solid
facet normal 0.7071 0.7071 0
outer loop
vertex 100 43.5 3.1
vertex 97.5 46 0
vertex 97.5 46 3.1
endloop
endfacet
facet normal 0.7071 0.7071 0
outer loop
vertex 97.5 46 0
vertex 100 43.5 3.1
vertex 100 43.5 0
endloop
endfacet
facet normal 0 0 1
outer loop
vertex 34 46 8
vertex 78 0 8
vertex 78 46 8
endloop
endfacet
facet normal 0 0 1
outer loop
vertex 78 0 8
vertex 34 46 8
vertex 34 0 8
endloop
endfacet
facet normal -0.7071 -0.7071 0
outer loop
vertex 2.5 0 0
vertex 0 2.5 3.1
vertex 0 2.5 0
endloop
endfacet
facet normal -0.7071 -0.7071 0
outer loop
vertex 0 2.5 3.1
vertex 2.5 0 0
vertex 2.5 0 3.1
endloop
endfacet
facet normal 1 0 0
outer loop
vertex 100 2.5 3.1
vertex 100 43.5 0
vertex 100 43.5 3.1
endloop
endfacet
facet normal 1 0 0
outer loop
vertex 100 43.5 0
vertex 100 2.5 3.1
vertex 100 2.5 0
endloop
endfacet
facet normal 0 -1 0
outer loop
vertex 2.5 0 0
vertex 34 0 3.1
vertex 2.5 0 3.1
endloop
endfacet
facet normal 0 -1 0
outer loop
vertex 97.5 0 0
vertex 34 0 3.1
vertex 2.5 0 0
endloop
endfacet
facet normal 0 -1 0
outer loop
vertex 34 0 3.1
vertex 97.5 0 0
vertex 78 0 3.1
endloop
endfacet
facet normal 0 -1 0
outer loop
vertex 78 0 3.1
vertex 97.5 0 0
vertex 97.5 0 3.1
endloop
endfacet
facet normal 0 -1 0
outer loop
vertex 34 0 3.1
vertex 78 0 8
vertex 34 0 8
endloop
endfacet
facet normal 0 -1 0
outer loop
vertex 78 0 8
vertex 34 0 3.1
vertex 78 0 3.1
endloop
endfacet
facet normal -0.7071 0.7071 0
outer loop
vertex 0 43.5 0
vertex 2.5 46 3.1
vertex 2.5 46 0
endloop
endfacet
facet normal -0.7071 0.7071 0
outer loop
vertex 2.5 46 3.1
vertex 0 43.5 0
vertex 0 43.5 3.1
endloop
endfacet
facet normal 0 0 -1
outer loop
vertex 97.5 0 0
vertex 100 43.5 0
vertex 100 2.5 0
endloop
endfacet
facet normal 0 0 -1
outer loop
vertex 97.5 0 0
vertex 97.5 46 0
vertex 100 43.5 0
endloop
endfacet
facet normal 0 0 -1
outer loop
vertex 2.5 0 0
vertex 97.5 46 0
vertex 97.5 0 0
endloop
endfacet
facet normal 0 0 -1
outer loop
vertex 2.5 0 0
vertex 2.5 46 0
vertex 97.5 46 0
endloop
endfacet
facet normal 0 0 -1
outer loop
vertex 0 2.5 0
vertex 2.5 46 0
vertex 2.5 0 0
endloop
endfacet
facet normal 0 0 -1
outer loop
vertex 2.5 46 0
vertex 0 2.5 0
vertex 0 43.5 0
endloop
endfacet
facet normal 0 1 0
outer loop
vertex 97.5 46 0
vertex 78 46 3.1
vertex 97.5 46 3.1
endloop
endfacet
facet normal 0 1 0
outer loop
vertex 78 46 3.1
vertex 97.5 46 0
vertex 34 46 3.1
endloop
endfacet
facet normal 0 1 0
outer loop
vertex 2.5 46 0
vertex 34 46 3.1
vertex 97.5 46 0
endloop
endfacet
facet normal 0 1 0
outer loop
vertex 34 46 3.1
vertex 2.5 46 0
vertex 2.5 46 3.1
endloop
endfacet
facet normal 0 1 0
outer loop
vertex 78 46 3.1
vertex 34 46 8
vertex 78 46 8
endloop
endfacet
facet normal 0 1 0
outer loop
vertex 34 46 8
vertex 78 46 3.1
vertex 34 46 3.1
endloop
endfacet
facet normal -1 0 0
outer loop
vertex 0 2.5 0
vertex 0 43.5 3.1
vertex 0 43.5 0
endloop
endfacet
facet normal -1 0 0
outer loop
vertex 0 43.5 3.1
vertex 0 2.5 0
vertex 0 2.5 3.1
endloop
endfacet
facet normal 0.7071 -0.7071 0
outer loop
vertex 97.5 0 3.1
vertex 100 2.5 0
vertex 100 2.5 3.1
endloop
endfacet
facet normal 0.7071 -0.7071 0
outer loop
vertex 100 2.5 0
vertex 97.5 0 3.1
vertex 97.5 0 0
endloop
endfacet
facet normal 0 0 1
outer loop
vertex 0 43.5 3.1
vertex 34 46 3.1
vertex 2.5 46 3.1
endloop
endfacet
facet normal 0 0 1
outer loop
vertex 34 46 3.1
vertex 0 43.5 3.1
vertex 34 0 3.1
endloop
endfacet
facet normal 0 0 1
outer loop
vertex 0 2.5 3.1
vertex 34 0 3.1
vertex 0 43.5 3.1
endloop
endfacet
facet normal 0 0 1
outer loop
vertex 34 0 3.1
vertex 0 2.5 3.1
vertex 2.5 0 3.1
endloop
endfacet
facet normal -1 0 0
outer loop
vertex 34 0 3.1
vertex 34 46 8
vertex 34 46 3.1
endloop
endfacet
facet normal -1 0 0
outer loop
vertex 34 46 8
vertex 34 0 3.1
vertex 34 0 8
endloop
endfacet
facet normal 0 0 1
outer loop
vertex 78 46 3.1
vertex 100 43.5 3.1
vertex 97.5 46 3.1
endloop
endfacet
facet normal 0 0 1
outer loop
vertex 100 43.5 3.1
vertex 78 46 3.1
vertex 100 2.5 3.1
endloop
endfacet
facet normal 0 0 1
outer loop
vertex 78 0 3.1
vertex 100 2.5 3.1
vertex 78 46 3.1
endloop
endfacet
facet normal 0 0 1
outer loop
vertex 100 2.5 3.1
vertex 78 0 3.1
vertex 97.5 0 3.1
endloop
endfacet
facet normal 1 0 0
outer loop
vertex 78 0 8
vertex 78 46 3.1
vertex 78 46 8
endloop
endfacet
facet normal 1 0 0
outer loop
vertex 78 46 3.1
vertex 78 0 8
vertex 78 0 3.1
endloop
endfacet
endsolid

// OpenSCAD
$fn = 32;

// ----------------------------------------------------------------------
// Stepped bar: centerstep, 100 x 46 x 8/3.1 mm
// ----------------------------------------------------------------------

// --- parameters (mm) ---
bar_l = 100;              // bar length, X
bar_w = 46;               // bar width, Y
plate_t = 8;              // thickness of the thick zone, Z
thin_t = 3.1;             // thickness of the thin zone
corner_c = 2.5;           // corner chamfer of the bar
step_cut = 4.9;           // material removed from the thin zone
thick_from = 34;          // start of the thick middle zone
thick_to = 78;            // end of the thick middle zone
depth_1 = 4.9;            // depth of cut 1 from the top face
depth_2 = 4.9;            // depth of cut 2 from the top face

profile = [[2.5, 0], [97.5, 0], [100, 2.5], [100, 43.5], [97.5, 46], [2.5, 46], [0, 43.5], [0, 2.5]];  // primary outline, 8 points, counter clockwise
void_1 = [[-1, -1], [34, -1], [34, 47], [-1, 47]];  // thin left end, 4 points
void_2 = [[78, -1], [101, -1], [101, 47], [78, 47]];  // thin right end, 4 points

// --- the one profile operation ---
difference() {
  linear_extrude(height = plate_t) polygon(points = profile);
  translate([0, 0, plate_t - depth_1])
    linear_extrude(height = depth_1 + 1) polygon(points = void_1);
  translate([0, 0, plate_t - depth_2])
    linear_extrude(height = depth_2 + 1) polygon(points = void_2);
}
